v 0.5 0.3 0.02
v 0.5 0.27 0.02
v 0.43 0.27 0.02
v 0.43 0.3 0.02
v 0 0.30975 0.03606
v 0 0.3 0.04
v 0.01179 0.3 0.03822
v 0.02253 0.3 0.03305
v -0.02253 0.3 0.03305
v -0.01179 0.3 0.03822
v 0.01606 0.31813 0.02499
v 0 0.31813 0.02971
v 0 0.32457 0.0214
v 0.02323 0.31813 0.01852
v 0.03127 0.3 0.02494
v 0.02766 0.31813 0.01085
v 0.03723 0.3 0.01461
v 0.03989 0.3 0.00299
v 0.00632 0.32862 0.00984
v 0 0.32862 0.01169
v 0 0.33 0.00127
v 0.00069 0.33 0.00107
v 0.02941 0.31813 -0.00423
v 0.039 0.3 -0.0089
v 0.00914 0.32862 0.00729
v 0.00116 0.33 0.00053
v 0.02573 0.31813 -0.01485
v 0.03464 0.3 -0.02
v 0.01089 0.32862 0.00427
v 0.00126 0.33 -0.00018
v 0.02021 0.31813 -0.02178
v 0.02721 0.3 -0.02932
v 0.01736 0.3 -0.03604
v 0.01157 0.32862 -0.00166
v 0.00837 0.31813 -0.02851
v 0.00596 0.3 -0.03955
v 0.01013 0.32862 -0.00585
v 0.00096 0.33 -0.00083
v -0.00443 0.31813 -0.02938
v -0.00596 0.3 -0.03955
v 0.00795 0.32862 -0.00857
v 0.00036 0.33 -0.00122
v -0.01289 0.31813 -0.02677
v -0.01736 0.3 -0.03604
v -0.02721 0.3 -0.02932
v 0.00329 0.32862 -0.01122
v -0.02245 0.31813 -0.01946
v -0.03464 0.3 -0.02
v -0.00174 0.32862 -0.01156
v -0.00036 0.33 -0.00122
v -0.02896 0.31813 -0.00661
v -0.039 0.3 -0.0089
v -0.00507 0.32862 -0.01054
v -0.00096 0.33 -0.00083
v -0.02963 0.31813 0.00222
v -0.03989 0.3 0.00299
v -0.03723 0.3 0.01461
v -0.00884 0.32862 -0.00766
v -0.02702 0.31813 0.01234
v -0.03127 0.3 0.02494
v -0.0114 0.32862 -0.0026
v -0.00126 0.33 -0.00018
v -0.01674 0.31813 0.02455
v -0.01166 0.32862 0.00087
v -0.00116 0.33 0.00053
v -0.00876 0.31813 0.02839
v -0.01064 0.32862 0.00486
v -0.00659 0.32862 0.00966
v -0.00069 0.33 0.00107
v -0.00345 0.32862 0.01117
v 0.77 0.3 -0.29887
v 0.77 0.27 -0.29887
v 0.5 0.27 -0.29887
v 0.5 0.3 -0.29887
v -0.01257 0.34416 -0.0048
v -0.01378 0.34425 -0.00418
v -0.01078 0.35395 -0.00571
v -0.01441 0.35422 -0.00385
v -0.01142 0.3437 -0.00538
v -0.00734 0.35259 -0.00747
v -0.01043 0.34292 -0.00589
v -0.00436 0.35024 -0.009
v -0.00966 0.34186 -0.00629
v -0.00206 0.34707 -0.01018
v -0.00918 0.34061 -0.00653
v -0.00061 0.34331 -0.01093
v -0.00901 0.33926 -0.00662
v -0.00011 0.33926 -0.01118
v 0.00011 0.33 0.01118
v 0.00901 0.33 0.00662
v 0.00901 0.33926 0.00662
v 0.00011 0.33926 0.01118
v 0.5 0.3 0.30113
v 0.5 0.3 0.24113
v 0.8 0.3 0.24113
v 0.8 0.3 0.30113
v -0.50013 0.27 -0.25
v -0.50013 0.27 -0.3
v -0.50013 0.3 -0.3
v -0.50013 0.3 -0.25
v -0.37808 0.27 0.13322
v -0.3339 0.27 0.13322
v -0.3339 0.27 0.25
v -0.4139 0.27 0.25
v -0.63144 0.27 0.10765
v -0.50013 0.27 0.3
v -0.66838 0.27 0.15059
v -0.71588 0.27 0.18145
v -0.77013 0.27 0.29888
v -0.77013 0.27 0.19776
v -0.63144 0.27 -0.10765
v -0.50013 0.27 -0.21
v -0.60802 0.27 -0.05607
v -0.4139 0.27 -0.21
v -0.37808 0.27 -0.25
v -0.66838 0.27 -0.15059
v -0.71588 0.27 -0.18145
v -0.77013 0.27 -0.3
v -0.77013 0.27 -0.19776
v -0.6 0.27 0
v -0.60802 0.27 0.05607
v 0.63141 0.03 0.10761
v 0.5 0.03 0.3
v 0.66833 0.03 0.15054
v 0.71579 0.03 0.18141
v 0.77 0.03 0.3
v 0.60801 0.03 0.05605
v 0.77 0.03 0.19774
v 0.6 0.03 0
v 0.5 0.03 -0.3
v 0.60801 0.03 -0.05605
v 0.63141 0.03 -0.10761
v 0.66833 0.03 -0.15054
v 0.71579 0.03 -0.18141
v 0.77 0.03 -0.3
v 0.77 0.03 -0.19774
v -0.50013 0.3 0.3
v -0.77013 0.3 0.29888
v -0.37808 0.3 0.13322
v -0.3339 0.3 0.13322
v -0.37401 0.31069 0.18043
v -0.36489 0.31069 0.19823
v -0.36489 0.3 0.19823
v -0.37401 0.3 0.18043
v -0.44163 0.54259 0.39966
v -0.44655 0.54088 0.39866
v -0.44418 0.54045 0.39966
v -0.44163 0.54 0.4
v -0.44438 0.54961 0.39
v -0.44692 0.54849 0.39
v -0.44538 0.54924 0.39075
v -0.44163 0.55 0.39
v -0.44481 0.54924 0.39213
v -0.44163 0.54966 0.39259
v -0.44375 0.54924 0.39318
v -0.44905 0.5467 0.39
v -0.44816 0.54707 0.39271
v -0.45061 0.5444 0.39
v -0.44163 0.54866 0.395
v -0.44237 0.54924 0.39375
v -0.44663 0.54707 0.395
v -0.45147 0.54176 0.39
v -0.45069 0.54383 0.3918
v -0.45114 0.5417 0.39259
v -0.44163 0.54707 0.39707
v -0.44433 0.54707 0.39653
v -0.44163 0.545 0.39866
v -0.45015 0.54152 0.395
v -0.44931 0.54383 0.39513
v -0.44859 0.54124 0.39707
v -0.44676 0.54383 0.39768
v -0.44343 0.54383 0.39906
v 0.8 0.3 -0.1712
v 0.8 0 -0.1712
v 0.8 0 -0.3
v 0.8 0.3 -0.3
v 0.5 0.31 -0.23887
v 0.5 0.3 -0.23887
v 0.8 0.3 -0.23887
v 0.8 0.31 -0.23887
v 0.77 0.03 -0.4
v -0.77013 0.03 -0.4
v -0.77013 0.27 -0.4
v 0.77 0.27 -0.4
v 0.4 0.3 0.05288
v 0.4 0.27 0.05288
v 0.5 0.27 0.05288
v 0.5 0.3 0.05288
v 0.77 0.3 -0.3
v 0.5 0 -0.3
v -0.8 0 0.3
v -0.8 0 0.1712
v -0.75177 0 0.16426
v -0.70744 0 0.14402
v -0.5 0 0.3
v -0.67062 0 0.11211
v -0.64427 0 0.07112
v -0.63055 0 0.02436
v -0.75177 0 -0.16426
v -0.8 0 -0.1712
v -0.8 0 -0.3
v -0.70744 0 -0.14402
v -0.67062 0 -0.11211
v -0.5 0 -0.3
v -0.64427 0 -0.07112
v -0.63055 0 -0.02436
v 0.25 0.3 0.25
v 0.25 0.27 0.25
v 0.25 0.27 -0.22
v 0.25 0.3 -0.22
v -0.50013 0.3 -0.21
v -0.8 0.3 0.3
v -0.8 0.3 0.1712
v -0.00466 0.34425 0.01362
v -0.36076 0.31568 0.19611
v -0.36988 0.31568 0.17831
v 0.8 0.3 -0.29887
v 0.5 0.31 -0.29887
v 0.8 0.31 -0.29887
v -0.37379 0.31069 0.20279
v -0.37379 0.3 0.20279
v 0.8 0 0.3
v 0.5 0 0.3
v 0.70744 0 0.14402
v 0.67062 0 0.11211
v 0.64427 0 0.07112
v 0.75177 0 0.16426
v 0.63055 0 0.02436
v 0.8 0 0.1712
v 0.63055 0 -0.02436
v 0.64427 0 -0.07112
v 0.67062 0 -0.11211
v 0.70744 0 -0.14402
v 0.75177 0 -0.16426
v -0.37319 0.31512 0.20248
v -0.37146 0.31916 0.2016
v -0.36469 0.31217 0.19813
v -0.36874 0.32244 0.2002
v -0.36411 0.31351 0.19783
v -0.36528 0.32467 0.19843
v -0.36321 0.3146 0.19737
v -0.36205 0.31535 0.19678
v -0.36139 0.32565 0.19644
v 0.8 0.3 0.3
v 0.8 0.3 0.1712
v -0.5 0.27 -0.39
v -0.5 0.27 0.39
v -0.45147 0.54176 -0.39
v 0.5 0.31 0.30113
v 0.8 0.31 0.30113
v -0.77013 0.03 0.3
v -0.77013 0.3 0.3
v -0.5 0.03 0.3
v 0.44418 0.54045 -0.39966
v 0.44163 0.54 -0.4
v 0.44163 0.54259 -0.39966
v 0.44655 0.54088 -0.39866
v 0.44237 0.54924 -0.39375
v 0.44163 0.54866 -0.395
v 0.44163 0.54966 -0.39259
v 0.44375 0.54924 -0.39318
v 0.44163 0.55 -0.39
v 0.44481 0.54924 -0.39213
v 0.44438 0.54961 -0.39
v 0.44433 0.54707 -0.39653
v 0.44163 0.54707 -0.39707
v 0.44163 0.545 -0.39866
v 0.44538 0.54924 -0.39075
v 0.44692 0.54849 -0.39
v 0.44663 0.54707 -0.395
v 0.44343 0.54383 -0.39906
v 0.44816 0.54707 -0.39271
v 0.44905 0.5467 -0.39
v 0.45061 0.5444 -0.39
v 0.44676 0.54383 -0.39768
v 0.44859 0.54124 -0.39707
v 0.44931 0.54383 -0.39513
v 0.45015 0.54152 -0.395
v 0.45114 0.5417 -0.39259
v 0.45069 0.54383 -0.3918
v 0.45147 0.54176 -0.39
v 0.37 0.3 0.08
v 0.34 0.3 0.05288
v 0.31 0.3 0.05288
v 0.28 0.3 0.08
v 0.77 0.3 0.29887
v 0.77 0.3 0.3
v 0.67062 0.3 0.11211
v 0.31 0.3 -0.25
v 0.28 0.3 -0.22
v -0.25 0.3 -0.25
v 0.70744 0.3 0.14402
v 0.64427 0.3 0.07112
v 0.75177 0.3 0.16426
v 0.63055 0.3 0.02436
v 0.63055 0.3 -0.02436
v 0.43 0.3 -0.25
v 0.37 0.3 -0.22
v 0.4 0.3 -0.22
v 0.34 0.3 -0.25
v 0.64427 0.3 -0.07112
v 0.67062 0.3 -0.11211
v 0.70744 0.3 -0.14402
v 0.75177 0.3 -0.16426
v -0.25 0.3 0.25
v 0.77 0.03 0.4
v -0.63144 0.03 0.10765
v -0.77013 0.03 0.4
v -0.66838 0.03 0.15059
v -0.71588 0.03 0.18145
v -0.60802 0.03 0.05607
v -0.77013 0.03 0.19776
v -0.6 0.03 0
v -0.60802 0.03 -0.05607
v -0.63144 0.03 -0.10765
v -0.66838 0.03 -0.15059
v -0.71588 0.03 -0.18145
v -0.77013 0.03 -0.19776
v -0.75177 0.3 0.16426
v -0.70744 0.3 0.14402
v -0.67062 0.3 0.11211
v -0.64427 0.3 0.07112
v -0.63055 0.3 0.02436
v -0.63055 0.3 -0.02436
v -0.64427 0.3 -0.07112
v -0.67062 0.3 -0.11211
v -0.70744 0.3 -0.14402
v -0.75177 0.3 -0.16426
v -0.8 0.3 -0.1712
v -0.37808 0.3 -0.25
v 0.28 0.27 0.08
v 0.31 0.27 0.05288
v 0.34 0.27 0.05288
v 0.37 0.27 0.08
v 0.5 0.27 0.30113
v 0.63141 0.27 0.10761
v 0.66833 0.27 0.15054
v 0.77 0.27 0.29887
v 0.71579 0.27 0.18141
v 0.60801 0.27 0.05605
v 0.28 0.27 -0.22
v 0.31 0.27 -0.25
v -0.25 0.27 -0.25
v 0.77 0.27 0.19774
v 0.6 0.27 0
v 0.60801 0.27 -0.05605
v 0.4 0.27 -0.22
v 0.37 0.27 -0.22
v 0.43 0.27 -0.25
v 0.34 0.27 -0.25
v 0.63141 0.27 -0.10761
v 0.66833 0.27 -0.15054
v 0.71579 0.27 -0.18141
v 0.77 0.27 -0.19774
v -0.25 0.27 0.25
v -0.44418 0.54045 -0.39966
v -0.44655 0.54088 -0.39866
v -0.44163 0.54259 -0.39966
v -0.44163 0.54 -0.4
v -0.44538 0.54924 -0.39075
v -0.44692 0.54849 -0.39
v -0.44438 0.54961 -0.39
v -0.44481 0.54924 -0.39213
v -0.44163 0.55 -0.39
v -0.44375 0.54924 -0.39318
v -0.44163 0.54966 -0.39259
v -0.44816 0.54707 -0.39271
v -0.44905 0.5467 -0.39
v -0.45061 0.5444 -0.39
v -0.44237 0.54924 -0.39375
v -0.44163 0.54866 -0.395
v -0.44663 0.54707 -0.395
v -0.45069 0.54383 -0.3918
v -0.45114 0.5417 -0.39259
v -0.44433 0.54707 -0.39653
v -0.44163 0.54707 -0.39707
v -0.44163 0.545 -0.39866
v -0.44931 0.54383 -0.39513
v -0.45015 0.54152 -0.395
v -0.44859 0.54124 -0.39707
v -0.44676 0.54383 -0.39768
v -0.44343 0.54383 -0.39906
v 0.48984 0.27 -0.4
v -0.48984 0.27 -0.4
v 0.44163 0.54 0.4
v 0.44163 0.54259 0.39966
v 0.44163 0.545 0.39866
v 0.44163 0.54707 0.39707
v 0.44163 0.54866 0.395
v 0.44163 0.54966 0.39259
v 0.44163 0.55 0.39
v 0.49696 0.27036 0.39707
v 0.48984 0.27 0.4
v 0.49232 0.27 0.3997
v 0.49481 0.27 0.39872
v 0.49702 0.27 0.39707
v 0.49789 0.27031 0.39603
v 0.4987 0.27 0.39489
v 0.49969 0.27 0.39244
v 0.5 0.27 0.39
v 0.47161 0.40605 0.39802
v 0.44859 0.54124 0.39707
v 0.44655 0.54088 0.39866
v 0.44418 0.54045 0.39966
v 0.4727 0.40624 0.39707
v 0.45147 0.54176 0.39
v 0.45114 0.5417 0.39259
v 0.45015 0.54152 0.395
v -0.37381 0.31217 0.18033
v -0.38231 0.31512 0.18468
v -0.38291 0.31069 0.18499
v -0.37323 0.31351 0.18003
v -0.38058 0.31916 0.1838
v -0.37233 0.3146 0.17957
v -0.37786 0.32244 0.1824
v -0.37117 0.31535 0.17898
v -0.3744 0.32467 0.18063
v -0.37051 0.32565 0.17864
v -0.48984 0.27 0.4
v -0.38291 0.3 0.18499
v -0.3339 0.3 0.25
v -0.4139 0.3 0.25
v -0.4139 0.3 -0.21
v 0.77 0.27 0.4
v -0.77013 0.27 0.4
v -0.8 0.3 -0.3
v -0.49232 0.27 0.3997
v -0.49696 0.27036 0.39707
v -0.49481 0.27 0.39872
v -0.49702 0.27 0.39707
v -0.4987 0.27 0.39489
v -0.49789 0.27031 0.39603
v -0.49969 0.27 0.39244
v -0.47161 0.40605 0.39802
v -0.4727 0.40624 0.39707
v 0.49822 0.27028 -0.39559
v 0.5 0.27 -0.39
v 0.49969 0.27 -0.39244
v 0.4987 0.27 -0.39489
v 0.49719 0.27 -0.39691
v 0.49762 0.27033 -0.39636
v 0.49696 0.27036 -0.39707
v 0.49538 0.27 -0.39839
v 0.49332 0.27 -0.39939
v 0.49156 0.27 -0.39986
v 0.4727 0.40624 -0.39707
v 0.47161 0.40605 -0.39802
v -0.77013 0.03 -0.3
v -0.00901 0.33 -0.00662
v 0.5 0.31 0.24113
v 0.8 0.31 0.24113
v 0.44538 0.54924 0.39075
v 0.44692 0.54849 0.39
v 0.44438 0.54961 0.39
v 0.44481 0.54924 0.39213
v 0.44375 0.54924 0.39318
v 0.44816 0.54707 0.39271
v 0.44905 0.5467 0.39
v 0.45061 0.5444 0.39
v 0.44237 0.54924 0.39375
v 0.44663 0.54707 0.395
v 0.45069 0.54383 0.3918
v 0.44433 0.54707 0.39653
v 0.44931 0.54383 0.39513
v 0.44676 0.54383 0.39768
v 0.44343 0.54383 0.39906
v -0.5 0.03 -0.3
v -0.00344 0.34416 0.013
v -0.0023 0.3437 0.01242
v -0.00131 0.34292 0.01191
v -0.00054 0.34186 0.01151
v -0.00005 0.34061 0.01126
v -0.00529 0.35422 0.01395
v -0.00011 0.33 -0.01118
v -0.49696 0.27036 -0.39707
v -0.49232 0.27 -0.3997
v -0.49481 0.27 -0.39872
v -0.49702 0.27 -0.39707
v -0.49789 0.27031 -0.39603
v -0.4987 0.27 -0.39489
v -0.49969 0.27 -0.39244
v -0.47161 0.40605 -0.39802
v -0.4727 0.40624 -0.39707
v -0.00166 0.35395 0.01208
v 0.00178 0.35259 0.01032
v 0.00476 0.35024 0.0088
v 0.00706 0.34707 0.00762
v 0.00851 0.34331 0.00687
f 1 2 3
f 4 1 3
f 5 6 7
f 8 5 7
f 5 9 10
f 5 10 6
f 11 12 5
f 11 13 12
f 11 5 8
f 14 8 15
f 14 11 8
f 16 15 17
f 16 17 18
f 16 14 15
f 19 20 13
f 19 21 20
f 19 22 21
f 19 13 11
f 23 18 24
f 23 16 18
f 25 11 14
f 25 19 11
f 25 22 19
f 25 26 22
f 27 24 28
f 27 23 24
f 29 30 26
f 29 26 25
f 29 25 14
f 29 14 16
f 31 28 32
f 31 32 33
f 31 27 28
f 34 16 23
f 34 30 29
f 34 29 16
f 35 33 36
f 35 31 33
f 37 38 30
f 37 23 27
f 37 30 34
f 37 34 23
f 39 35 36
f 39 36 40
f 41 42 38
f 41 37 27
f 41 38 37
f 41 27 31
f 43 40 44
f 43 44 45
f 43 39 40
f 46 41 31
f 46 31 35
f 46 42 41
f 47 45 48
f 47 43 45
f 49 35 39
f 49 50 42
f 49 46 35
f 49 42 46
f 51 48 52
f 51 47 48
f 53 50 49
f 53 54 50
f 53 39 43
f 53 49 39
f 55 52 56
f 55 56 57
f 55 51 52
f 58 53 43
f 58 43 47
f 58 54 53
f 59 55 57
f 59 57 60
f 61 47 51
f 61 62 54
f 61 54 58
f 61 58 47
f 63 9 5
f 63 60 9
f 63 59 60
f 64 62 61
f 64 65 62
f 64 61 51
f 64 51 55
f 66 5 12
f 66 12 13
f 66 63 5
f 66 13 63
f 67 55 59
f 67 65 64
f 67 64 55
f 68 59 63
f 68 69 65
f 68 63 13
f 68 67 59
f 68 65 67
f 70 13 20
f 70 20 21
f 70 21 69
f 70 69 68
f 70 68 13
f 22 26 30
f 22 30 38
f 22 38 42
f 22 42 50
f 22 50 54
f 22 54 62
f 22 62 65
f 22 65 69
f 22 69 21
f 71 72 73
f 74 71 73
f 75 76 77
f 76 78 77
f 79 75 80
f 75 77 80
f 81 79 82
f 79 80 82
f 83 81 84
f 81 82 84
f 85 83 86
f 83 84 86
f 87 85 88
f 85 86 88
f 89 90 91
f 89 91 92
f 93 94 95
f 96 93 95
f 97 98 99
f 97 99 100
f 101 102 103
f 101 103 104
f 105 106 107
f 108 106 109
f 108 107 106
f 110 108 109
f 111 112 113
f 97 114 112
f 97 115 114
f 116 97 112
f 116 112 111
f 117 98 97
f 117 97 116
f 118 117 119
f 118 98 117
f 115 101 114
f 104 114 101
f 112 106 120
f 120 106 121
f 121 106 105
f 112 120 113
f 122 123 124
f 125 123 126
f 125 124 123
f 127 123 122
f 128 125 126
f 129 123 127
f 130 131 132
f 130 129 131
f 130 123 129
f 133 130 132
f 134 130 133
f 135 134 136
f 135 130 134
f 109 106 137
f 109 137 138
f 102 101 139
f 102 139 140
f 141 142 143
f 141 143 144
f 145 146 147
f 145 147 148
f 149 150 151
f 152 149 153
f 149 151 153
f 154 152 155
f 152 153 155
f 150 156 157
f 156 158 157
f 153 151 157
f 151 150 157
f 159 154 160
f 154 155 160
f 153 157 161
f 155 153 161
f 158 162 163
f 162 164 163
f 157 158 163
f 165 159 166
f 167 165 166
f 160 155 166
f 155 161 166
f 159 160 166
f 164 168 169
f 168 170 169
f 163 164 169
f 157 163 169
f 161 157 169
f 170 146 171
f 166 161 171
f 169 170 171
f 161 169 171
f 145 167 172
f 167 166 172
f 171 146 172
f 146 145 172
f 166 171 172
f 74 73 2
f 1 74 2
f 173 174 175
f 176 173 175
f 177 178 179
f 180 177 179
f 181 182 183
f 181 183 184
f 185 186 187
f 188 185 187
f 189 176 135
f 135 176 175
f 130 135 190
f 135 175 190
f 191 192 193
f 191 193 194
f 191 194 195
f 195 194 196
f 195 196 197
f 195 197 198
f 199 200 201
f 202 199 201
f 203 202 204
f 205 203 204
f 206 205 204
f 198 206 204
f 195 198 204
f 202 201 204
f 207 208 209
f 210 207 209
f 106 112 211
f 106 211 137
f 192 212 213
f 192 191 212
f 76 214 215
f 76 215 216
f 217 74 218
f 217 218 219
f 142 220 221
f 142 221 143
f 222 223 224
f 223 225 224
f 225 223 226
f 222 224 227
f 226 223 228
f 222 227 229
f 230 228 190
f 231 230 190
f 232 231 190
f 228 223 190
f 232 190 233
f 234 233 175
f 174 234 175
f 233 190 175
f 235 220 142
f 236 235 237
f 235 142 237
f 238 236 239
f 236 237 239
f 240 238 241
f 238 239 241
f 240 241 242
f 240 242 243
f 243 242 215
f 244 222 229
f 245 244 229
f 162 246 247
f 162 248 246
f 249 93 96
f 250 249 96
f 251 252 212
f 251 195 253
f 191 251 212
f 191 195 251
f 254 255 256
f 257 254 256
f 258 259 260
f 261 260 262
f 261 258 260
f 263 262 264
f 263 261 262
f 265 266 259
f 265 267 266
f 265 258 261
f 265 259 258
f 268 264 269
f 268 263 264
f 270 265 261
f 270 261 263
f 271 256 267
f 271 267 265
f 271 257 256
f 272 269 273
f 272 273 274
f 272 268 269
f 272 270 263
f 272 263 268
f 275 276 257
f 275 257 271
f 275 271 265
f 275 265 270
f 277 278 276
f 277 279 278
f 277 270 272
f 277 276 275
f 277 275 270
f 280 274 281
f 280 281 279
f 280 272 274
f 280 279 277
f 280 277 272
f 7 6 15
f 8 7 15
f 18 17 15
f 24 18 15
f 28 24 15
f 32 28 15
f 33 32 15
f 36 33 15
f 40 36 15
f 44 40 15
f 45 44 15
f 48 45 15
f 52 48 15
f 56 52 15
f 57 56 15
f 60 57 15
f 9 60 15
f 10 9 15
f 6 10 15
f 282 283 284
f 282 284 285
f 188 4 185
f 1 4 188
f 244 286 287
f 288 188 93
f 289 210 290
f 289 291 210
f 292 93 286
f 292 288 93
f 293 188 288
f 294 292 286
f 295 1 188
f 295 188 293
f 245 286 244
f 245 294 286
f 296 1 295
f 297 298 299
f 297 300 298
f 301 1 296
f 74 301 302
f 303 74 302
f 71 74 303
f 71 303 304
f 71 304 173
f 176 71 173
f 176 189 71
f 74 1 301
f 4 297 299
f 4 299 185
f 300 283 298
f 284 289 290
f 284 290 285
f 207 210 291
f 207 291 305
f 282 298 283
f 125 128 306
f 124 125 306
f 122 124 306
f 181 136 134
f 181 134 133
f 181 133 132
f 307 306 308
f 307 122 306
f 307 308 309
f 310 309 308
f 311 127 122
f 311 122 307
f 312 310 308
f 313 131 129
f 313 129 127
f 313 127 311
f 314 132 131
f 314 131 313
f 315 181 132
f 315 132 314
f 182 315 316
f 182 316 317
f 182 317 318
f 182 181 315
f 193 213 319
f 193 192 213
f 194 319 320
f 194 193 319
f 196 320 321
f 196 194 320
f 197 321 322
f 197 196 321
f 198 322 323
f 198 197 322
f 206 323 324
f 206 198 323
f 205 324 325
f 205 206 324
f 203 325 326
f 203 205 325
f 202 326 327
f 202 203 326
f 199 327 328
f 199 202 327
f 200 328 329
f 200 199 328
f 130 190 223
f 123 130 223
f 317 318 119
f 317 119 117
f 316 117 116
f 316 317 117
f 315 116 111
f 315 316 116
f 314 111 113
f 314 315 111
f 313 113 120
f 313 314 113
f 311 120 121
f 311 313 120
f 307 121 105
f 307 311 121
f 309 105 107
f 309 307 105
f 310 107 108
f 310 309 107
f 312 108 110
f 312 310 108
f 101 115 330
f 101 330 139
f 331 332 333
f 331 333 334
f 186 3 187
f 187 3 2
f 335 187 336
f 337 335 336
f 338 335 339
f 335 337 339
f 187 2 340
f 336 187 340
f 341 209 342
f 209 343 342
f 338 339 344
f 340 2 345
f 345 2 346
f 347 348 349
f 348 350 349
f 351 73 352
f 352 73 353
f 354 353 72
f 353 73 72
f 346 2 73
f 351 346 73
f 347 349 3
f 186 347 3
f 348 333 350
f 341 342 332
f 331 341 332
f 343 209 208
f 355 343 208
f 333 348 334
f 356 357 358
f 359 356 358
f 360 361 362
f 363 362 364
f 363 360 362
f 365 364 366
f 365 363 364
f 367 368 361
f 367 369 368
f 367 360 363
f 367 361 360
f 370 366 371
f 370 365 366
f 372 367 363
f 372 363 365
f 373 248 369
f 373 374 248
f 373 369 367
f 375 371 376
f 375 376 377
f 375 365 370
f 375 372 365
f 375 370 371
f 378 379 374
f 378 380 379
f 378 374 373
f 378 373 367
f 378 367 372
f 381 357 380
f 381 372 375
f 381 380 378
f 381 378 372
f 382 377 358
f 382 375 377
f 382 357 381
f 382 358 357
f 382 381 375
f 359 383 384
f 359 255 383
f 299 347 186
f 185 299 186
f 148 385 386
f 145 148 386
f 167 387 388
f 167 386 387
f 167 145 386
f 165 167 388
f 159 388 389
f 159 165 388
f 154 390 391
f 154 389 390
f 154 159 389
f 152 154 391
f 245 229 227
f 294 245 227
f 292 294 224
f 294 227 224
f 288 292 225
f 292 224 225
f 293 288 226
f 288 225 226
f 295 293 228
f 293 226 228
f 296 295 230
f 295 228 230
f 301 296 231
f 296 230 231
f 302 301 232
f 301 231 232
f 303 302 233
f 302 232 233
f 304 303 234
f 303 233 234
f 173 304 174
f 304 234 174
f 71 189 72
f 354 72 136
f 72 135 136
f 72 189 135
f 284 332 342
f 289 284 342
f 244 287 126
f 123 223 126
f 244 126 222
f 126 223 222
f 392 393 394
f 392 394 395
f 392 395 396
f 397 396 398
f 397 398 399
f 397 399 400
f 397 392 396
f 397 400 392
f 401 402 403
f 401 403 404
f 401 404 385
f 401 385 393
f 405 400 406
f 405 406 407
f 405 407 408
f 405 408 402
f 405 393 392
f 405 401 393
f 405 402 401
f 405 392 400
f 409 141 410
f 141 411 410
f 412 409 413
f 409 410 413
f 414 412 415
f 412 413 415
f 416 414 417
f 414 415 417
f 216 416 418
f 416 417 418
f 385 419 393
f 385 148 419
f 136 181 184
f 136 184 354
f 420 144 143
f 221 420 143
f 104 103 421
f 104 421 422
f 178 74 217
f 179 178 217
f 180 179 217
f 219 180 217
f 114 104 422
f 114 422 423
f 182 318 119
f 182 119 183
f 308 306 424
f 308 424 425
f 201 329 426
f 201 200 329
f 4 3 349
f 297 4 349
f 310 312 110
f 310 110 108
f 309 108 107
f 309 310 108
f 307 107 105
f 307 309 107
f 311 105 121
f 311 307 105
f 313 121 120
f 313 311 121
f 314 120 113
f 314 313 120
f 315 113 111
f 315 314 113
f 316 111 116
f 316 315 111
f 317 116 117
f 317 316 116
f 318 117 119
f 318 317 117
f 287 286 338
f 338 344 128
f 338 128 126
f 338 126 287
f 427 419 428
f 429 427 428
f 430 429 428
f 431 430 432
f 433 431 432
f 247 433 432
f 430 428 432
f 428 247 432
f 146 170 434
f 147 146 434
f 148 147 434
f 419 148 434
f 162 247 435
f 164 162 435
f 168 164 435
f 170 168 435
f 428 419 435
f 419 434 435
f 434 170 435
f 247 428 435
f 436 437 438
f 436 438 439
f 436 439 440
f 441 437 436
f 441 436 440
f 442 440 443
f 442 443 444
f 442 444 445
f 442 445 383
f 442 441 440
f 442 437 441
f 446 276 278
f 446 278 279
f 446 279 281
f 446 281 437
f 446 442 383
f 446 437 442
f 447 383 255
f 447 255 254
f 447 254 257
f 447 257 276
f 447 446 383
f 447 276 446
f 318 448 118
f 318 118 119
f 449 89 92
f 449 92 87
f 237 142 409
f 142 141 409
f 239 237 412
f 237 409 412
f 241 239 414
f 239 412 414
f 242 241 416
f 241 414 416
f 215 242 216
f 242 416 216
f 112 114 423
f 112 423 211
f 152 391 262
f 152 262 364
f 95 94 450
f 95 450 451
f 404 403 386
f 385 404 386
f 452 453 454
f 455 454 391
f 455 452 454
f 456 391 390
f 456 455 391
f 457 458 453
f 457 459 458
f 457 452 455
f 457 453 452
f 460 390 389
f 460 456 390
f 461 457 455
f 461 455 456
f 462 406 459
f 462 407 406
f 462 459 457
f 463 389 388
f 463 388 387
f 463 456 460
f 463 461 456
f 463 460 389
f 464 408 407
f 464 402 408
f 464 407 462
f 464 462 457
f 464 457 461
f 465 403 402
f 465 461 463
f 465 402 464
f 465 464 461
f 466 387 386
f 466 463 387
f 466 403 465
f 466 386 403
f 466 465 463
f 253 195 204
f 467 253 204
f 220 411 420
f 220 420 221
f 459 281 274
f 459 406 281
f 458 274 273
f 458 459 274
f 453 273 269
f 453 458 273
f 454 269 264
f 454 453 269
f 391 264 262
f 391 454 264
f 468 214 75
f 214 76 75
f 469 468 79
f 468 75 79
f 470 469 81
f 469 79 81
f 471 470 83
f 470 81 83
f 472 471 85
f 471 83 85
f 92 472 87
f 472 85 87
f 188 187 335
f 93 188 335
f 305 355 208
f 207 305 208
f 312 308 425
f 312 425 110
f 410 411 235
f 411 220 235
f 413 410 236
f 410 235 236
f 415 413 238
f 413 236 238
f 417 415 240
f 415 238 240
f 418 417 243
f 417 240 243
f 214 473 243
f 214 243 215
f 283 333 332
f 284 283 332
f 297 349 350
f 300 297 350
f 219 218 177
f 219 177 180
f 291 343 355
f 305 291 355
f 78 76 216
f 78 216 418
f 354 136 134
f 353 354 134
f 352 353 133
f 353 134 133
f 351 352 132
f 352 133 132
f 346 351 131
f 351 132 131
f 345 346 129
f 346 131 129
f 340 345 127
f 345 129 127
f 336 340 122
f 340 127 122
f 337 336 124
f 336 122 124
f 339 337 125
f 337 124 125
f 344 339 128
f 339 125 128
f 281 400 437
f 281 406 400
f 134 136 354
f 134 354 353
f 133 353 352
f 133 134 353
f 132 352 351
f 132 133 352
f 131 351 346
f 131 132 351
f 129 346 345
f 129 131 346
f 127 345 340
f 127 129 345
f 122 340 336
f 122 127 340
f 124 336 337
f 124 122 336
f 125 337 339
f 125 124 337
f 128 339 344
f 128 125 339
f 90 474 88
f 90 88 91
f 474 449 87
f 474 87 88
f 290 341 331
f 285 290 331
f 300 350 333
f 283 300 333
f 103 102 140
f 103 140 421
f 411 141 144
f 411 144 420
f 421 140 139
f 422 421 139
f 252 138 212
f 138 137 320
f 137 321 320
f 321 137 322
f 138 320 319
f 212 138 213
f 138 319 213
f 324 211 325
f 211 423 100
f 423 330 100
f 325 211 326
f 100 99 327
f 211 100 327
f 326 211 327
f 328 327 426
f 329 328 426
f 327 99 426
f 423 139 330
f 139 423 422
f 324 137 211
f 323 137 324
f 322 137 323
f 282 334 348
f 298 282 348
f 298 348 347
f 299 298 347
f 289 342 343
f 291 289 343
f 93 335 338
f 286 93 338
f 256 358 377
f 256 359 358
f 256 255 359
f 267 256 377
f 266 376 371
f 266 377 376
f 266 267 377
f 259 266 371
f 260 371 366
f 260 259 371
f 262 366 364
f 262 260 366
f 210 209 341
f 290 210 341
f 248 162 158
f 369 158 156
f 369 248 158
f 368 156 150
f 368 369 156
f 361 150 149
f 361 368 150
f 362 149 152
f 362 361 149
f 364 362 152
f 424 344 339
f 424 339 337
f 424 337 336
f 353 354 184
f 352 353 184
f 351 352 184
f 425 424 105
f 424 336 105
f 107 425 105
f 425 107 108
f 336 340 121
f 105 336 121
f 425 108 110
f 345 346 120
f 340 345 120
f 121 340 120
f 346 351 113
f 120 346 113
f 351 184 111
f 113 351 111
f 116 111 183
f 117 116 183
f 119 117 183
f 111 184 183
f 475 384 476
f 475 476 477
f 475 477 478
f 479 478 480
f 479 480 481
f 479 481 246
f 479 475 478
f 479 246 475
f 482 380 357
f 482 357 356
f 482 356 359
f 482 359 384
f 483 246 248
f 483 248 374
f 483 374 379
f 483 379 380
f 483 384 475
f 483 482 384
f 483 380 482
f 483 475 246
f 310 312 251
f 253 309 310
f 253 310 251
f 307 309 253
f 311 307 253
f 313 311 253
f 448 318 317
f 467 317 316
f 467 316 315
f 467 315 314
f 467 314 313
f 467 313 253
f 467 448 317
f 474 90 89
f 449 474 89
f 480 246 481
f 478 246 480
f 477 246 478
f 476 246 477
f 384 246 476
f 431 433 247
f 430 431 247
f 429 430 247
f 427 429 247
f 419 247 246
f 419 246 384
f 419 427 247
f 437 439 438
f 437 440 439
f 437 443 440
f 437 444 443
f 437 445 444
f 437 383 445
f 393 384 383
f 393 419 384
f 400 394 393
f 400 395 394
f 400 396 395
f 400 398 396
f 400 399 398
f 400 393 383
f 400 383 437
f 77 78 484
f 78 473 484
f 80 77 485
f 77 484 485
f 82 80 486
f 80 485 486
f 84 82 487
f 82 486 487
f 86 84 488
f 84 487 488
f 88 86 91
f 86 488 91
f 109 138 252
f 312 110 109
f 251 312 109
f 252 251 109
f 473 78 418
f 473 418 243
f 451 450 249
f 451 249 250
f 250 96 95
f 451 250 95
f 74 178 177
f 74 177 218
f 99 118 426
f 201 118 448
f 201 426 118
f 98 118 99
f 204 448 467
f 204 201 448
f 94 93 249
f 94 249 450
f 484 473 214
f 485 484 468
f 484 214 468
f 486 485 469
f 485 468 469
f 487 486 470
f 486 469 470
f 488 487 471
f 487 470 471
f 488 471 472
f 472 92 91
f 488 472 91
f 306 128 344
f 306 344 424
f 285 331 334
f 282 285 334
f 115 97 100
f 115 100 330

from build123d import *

# Parameters (mm, degrees)
EXTRUDE_1_DEPTH   = 0.03
EXTRUDE_1_2_DEPTH = 0.03
EXTRUDE_2_DEPTH   = 0.27
EXTRUDE_3_DEPTH   = 0.24
EXTRUDE_4_DEPTH   = 0.03
EXTRUDE_4_2_DEPTH = 0.03
SKETCH_9_R        = 0.04
EXTRUDE_5_DEPTH   = 0.03
FILLET_1_R        = 0.04
FILLET_2_R        = 0.01
SKETCH_18_W       = 0.3
SKETCH_18_H       = 0.06
EXTRUDE_8_DEPTH   = 0.01
EXTRUDE_8_2_DEPTH = 0.01


with BuildPart() as part:
    # Эскиз1 → Бобышка-Вытянуть1 (new body)
    with BuildSketch(Plane(origin=(0, 0, 0), x_dir=(1, 0, 0), z_dir=(0, 1, 0))):
        with BuildLine():
            Line((-0.8, 0.3), (-0.8, 0.171196845))
            ThreePointArc((-0.8, 0.171196845), (-0.628803155, 0), (-0.8, -0.171196845))
            Line((-0.8, -0.171196845), (-0.8, -0.3))
            Line((-0.8, -0.3), (-0.5, -0.3))
            Line((-0.5, -0.3), (-0.5, 0.3))
            Line((-0.5, 0.3), (-0.8, 0.3))
        make_face()
    extrude(amount=EXTRUDE_1_DEPTH)



with BuildPart() as body_2:
    # Эскиз1 → Extrude 1 2 (new body)
    with BuildSketch(Plane(origin=(0, 0, 0), x_dir=(1, 0, 0), z_dir=(0, 1, 0))):
        with BuildLine():
            Line((0.8, 0.3), (0.5, 0.3))
            Line((0.5, 0.3), (0.5, -0.3))
            Line((0.5, -0.3), (0.8, -0.3))
            Line((0.8, -0.3), (0.8, -0.171196845))
            ThreePointArc((0.8, -0.171196845), (0.628803155, 0), (0.8, 0.171196845))
            Line((0.8, 0.171196845), (0.8, 0.3))
        make_face()
    extrude(amount=EXTRUDE_1_2_DEPTH)


with BuildPart() as part_1:
    add(part.part)

    add(body_2.part)  # Бобышка-Вытянуть2 merges body 2
    # Эскиз2 → Бобышка-Вытянуть2 (add)
    with BuildSketch(Plane(origin=(0, 0.03, 0), x_dir=(1, 0, 0), z_dir=(0, 1, 0))):
        with BuildLine():
            Line((-0.8, 0.171196845), (-0.8, 0.3))
            Line((-0.8, 0.3), (-0.770127922, 0.3))
            Line((-0.770127922, 0.3), (-0.770127922, 0.197756565))
            ThreePointArc((-0.770127922, 0.197756565), (-0.6, 0), (-0.770127922, -0.197756565))
            Line((-0.770127922, -0.197756565), (-0.770127922, -0.3))
            Line((-0.770127922, -0.3), (-0.8, -0.3))
            Line((-0.8, -0.3), (-0.8, -0.171196845))
            ThreePointArc((-0.8, -0.171196845), (-0.628803155, 0), (-0.8, 0.171196845))
        make_face()
        with BuildLine():
            Line((0.8, 0.171196845), (0.8, 0.3))
            Line((0.8, 0.3), (0.770002872, 0.3))
            Line((0.770002872, 0.3), (0.770002872, 0.197737635))
            ThreePointArc((0.770002872, 0.197737635), (0.6, 0), (0.770002872, -0.197737635))
            Line((0.770002872, -0.197737635), (0.770002872, -0.3))
            Line((0.770002872, -0.3), (0.8, -0.3))
            Line((0.8, -0.3), (0.8, -0.171196845))
            ThreePointArc((0.8, -0.171196845), (0.628803155, 0), (0.8, 0.171196845))
        make_face()
    extrude(amount=EXTRUDE_2_DEPTH)


with BuildPart() as body_2_2:
    # Эскиз3 → Бобышка-Вытянуть3 (new body)
    with BuildSketch(Plane(origin=(0, 0.03, 0), x_dir=(1, 0, 0), z_dir=(0, 1, 0))):
        with BuildLine():
            Line((-0.770127922, 0.197756565), (-0.770127922, 0.4))
            Line((-0.770127922, 0.4), (0.770002872, 0.4))
            Line((0.770002872, 0.4), (0.770002872, 0.197737635))
            ThreePointArc((0.770002872, 0.197737635), (0.6, 0), (0.770002872, -0.197737635))
            Line((0.770002872, -0.197737635), (0.770002872, -0.4))
            Line((0.770002872, -0.4), (-0.770127922, -0.4))
            Line((-0.770127922, -0.4), (-0.770127922, -0.197756565))
            ThreePointArc((-0.770127922, -0.197756565), (-0.6, 0), (-0.770127922, 0.197756565))
        make_face()
    extrude(amount=EXTRUDE_3_DEPTH)


with BuildPart() as body_3:
    # Эскиз4 → Бобышка-Вытянуть4 (new body)
    with BuildSketch(Plane(origin=(0, 0.27, 0), x_dir=(1, 0, 0), z_dir=(0, 1, 0))):
        with BuildLine():
            Line((-0.770127922, 0.197756565), (-0.770127922, 0.3))
            Line((-0.770127922, 0.3), (-0.500127922, 0.3))
            Line((-0.500127922, 0.3), (-0.500127922, 0.25))
            Line((-0.500127922, 0.25), (-0.378083422, 0.25))
            Line((-0.378083422, 0.25), (-0.378083422, -0.133218672))
            Line((-0.378083422, -0.133218672), (-0.333899038, -0.133218672))
            Line((-0.333899038, -0.133218672), (-0.333899038, -0.25))
            Line((-0.333899038, -0.25), (-0.413899038, -0.25))
            Line((-0.413899038, -0.25), (-0.413899038, 0.21))
            Line((-0.413899038, 0.21), (-0.500127922, 0.21))
            Line((-0.500127922, 0.21), (-0.500127922, -0.3))
            Line((-0.500127922, -0.3), (-0.770127922, -0.298878282))
            Line((-0.770127922, -0.298878282), (-0.770127922, -0.197756565))
            ThreePointArc((-0.770127922, -0.197756565), (-0.6, 0), (-0.770127922, 0.197756565))
        make_face()
    extrude(amount=EXTRUDE_4_DEPTH)


with BuildPart() as body_4:
    # Эскиз4 → Extrude 4 2 (new body)
    with BuildSketch(Plane(origin=(0, 0.27, 0), x_dir=(1, 0, 0), z_dir=(0, 1, 0))):
        with BuildLine():
            Line((0.770002872, 0.197737635), (0.770002872, 0.298868817))
            Line((0.770002872, 0.298868817), (0.500002872, 0.298868817))
            Line((0.500002872, 0.298868817), (0.500002872, -0.02))
            Line((0.500002872, -0.02), (0.43, -0.02))
            Line((0.43, -0.02), (0.43, 0.25))
            Line((0.43, 0.25), (0.34, 0.25))
            Line((0.34, 0.25), (0.34, -0.052883428))
            Line((0.34, -0.052883428), (0.31, -0.052883428))
            Line((0.31, -0.052883428), (0.31, 0.25))
            Line((0.31, 0.25), (-0.25, 0.25))
            Line((-0.25, 0.25), (-0.25, -0.25))
            Line((-0.25, -0.25), (0.25, -0.25))
            Line((0.25, -0.25), (0.25, 0.22))
            Line((0.25, 0.22), (0.28, 0.22))
            Line((0.28, 0.22), (0.28, -0.08))
            Line((0.28, -0.08), (0.37, -0.08))
            Line((0.37, -0.08), (0.37, 0.22))
            Line((0.37, 0.22), (0.4, 0.22))
            Line((0.4, 0.22), (0.4, -0.052883428))
            Line((0.4, -0.052883428), (0.500002872, -0.052883428))
            Line((0.500002872, -0.052883428), (0.500002872, -0.301131183))
            Line((0.500002872, -0.301131183), (0.770002872, -0.298868817))
            Line((0.770002872, -0.298868817), (0.770002872, -0.197737635))
            ThreePointArc((0.770002872, -0.197737635), (0.6, 0), (0.770002872, 0.197737635))
        make_face()
    extrude(amount=EXTRUDE_4_2_DEPTH)


with BuildPart() as body_5:
    # Эскиз9 → Бобышка-Вытянуть5 (new body)
    with BuildSketch(Plane(origin=(0, 0.3, 0), x_dir=(1, 0, 0), z_dir=(0, 1, 0))):
        with Locations(Location((0, 0, 0), (0, 0, 270))):
            Circle(SKETCH_9_R)
    extrude(amount=EXTRUDE_5_DEPTH)

    # Скругление1
    # the kernel refuses this fillet: 0.04 mm, written as the material it takes off along each edge
    with BuildSketch(Plane(origin=(0, 0.33, 0), x_dir=(0, 0, 1), z_dir=(-1, 0, 0))) as fillet_1_piece_1:
        with BuildLine():
            CenterArc((0.001270167, -0.04), FILLET_1_R, 14.477512185, 75.522487815)
            Line((0.001270167, 0), (0.001270167, 0.0008))
            Line((0.001270167, 0.0008), (0.04, 0.0008))
            Line((0.04, 0.0008), (0.0408, 0))
            ThreePointArc((0.0408, 0), (0.0408, -0.015), (0.040774597, -0.0298))
            Line((0.040774597, -0.0298), (0.04, -0.03))
        make_face()
    revolve(axis=Axis((0, 0.33, 0), (0, 1, 0)), mode=Mode.SUBTRACT)


with BuildPart() as body_6:
    # По траектории1: sweep along a path in Эскиз11
    with BuildLine(Plane(origin=(0, 0, 0), x_dir=(-0.8899466991308816, 0, 0.4560645488371663), z_dir=(-0.4560645488371663, 0, -0.8899466991308816))) as sweep_1_path:
        Line((0.42013644, 0.3), (0.42013644, 0.310688593))
        ThreePointArc((0.42013644, 0.310688593), (0.417454992, 0.317503194), (0.41084868, 0.320663196))
        Line((0.41084868, 0.320663196), (0.01071224, 0.349235088))
        ThreePointArc((0.01071224, 0.349235088), (0.003185398, 0.346579037), (0, 0.339260485))
        Line((0, 0.339260485), (0, 0.33))
    # Эскиз14 → По траектории1 (sweep)
    with BuildSketch(Plane(origin=(0, 0.3, 0), x_dir=(1, 0, 0), z_dir=(0, 1, 0))):
        Polygon((-0.382909417, -0.184990192), (-0.37400995, -0.180429546), (-0.364888659, -0.19822848), (-0.373788126, -0.202789126), align=None)
    sweep(path=sweep_1_path.line)


with BuildPart() as body_7:
    # Эскиз5 → По сечениям1 section 0
    with BuildSketch(Plane(origin=(0, 0.27, 0), x_dir=(1, 0, 0), z_dir=(0, 1, 0))):
        with BuildLine():
            Line((-0.5, -0.4), (0.5, -0.4))
            Line((0.5, -0.4), (0.5, 0.4))
            Line((0.5, 0.4), (-0.5, 0.4))
            Line((-0.5, 0.4), (-0.5, -0.4))
        make_face()
    # Эскиз17 → По сечениям1 section 1
    with BuildSketch(Plane(origin=(0, 0.55, 0), x_dir=(1, 0, 0), z_dir=(0, 1, 0))):
        with BuildLine():
            Line((-0.45, 0.4), (0.45, 0.4))
            Line((0.45, 0.4), (0.45, -0.4))
            Line((0.45, -0.4), (-0.45, -0.4))
            Line((-0.45, -0.4), (-0.45, 0.4))
        make_face()
    loft()

    # Скругление2
    fillet_2_edges = [body_7.edges().sort_by_distance(p)[0] for p in [
        (-0.475, 0.41, -0.4),
        (0.475, 0.41, -0.4),
        (0.475, 0.41, 0.4),
        (-0.475, 0.41, 0.4),
        (-0.45, 0.55, 0),
        (0, 0.55, -0.4),
        (0.45, 0.55, 0),
        (0, 0.55, 0.4),
    ]]
    fillet(fillet_2_edges, radius=FILLET_2_R)


with BuildPart() as body_8:
    # Эскиз18 → Бобышка-Вытянуть8 (new body)
    with BuildSketch(Plane(origin=(0, 0.3, 0), x_dir=(1, 0, 0), z_dir=(0, 1, 0))):
        with Locations((0.650002872, 0.268868817)):
            Rectangle(SKETCH_18_W, SKETCH_18_H)
    extrude(amount=EXTRUDE_8_DEPTH)


with BuildPart() as body_9:
    # Эскиз18 → Extrude 8 2 (new body)
    with BuildSketch(Plane(origin=(0, 0.3, 0), x_dir=(1, 0, 0), z_dir=(0, 1, 0))):
        with Locations((0.650002872, -0.271131183)):
            Rectangle(SKETCH_18_W, SKETCH_18_H)
    extrude(amount=EXTRUDE_8_2_DEPTH)


with BuildPart() as part_2:
    add(part_1.part)

    # Combine 5: union body 4
    add(body_4.part)


with BuildPart() as body_3_1:
    add(body_3.part)

    # Combine 6: union part
    add(part_2.part)


solid = Compound([body_2_2.part, body_5.part, body_6.part, body_7.part, body_8.part, body_9.part, body_3_1.part])
